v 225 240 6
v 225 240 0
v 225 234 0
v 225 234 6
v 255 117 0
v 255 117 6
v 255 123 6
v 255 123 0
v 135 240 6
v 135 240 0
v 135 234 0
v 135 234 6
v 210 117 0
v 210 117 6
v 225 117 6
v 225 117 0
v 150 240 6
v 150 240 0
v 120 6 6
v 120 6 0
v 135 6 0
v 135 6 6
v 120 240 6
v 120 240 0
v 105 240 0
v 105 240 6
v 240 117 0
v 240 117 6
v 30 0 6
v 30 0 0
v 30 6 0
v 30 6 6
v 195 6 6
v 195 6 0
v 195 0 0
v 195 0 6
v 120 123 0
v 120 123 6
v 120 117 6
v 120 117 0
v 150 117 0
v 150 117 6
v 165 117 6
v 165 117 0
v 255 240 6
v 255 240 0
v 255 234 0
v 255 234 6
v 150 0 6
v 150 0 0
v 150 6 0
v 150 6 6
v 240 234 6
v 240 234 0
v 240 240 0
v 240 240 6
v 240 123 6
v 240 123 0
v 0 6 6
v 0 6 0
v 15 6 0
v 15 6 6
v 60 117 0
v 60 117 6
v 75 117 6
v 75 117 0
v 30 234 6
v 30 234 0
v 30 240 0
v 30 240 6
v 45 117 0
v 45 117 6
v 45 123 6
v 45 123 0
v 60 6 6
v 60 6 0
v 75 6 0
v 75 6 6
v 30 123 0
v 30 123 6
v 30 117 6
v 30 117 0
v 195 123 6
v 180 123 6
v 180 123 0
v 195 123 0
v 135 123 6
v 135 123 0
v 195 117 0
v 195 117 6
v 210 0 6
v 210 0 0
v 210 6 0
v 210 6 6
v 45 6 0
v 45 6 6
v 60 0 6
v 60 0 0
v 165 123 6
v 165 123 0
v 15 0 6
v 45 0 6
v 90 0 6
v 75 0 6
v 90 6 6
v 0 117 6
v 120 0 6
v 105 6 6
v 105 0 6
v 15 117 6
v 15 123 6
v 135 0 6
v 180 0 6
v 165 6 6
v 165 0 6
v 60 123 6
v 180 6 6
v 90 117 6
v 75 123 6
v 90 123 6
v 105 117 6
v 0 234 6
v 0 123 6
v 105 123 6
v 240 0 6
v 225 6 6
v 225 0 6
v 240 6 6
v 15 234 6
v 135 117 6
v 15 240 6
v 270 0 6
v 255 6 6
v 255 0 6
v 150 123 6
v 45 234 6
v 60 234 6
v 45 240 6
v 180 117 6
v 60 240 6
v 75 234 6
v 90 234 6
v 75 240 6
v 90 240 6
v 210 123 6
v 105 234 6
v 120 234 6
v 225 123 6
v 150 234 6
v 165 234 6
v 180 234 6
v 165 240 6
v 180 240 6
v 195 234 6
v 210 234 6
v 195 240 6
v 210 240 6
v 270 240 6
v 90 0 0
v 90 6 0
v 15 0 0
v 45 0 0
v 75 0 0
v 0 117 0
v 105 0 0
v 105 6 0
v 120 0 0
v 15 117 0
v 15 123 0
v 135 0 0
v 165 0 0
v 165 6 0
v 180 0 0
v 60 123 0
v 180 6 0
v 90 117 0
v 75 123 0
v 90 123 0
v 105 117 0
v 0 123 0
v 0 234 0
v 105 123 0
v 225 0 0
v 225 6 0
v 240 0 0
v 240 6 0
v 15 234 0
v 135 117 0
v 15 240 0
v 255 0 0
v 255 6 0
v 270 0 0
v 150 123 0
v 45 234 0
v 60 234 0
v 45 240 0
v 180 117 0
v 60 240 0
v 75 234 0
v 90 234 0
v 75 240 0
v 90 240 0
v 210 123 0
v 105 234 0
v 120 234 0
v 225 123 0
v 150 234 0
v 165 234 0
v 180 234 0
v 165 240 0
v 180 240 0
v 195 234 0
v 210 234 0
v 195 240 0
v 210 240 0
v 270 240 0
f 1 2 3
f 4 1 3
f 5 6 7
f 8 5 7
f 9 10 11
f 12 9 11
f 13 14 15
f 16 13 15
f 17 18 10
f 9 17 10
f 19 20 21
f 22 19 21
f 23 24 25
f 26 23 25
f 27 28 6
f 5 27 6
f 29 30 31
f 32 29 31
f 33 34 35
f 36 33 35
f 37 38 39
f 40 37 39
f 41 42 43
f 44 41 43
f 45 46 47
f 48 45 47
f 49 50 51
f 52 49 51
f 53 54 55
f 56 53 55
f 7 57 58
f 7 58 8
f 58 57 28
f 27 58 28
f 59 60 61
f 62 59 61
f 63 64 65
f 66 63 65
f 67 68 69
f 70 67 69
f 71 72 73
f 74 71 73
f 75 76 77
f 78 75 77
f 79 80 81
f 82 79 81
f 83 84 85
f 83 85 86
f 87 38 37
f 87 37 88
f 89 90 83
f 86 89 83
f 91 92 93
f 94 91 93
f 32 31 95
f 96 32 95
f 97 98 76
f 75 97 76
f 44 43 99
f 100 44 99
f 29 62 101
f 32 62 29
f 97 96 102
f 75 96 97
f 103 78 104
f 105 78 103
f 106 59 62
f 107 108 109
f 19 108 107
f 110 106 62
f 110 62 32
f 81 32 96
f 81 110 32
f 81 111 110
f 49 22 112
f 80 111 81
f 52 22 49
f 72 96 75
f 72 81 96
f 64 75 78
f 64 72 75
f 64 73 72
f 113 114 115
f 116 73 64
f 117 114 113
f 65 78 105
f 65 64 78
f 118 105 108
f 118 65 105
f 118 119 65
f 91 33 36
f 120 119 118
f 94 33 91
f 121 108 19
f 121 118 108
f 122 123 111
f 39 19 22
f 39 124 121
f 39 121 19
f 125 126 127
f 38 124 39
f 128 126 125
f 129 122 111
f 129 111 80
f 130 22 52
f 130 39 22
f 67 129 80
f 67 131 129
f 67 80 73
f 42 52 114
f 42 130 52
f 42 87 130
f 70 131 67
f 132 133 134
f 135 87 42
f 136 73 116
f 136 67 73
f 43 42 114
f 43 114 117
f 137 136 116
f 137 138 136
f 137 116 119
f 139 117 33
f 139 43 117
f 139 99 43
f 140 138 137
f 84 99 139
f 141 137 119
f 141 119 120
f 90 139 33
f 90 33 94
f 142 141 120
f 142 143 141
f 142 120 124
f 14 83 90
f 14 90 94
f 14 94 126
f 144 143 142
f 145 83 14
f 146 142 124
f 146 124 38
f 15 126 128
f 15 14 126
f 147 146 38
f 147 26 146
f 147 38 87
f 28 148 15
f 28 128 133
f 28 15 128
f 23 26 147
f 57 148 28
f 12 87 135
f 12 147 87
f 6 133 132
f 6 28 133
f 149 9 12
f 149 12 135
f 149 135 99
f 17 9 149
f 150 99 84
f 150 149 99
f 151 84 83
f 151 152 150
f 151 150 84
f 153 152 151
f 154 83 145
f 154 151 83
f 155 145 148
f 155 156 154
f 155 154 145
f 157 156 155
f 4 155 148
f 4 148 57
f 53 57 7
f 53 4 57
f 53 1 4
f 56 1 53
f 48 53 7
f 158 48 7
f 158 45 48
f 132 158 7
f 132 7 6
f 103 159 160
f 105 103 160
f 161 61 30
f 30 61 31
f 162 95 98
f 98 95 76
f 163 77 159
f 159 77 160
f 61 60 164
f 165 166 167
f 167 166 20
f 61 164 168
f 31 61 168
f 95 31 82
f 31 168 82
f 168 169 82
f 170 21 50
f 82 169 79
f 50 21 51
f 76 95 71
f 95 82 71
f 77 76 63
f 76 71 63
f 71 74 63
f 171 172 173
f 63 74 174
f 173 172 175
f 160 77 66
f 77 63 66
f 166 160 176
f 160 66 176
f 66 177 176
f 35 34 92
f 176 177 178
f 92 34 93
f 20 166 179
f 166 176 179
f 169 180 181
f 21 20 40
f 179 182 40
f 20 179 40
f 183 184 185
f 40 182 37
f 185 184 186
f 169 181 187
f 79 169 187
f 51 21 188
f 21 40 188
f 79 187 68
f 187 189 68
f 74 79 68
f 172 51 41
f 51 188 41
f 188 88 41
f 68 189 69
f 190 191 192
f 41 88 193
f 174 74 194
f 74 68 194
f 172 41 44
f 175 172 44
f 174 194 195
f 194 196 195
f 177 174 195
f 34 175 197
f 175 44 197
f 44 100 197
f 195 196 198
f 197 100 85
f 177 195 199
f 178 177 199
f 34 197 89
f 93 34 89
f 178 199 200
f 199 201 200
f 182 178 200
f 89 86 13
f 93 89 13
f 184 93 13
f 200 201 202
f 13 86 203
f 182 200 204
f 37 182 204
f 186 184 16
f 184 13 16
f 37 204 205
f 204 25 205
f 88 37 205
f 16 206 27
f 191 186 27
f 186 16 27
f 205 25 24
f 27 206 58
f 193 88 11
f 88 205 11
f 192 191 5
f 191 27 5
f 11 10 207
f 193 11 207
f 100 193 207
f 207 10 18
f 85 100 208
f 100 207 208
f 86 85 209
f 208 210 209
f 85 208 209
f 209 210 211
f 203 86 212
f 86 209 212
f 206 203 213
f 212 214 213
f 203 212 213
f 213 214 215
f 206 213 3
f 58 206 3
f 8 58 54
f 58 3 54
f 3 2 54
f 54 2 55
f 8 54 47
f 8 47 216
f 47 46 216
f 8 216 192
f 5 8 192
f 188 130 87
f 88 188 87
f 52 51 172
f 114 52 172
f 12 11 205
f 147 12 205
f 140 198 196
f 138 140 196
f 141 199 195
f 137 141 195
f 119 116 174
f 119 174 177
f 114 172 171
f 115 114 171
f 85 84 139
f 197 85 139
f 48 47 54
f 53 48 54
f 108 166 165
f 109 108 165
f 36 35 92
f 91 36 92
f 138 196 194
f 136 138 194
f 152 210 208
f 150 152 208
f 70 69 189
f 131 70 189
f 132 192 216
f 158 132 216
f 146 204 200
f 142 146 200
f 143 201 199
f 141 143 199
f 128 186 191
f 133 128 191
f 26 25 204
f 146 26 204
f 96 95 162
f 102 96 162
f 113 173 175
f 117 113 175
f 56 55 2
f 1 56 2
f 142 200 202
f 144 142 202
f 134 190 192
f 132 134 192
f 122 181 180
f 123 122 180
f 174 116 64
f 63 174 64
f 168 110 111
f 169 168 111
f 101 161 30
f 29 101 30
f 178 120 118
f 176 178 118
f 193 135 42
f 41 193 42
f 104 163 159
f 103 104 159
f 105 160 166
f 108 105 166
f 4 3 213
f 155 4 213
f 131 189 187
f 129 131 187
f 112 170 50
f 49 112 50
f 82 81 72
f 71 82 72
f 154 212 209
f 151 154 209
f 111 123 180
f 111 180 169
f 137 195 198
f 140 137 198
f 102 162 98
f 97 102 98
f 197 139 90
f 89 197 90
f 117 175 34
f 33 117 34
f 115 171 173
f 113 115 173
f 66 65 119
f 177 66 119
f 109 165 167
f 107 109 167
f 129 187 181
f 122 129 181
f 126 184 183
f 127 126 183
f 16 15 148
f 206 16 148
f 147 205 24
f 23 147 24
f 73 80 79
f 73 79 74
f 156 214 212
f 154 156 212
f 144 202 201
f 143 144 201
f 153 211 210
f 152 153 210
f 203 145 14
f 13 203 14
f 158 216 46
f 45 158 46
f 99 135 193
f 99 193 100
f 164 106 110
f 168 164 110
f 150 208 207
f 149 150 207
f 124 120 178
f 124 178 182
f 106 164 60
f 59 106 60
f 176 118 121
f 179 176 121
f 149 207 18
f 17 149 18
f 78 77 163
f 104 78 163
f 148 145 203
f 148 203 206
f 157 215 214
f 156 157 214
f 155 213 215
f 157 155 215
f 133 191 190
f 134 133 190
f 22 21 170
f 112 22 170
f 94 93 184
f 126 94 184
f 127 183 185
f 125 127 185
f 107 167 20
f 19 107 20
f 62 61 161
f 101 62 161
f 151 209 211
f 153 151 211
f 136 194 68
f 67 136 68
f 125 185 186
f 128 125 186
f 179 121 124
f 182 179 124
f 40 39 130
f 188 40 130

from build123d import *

# Parameters (mm, degrees)
F1_DEPTH = 6
F2_W     = 15
F2_H     = 3
F3_DEPTH = 6.001


with BuildPart() as f1:
    # F0 (on Top) → F1 (new body)
    with BuildSketch(Plane.XY):
        Polygon((15, 6), (15, 0), (30, 0), (30, 6), (45, 6), (45, 0), (60, 0), (60, 6), (75, 6), (75, 0), (90, 0), (90, 6), (105, 6), (105, 0), (120, 0), (120, 6), (135, 6), (135, 0), (150, 0), (150, 6), (165, 6), (165, 0), (180, 0), (180, 6), (195, 6), (195, 0), (210, 0), (210, 6), (225, 6), (225, 0), (240, 0), (240, 6), (255, 6), (255, 0), (270, 0), (270, 240), (255, 240), (255, 234), (240, 234), (240, 240), (225, 240), (225, 234), (210, 234), (210, 240), (195, 240), (195, 234), (180, 234), (180, 240), (165, 240), (165, 234), (150, 234), (150, 240), (135, 240), (135, 234), (120, 234), (120, 240), (105, 240), (105, 234), (90, 234), (90, 240), (75, 240), (75, 234), (60, 234), (60, 240), (45, 240), (45, 234), (30, 234), (30, 240), (15, 240), (15, 234), (0, 234), (0, 6), align=None)
    extrude(amount=F1_DEPTH)

    # F2 (on face) → F3 (cut, through all)
    with BuildSketch(Plane.XY.offset(6)):
        with Locations((7.5, 121.5)):
            Rectangle(F2_W, F2_H)
        with Locations((7.5, 118.5)):
            Rectangle(F2_W, F2_H)
        with Locations((37.5, 121.5)):
            Rectangle(F2_W, F2_H)
        with Locations((37.5, 118.5)):
            Rectangle(F2_W, F2_H)
        with Locations((67.5, 121.5)):
            Rectangle(F2_W, F2_H)
        with Locations((67.5, 118.5)):
            Rectangle(F2_W, F2_H)
        with Locations((97.5, 121.5)):
            Rectangle(F2_W, F2_H)
        with Locations((97.5, 118.5)):
            Rectangle(F2_W, F2_H)
        with Locations((127.5, 121.5)):
            Rectangle(F2_W, F2_H)
        with Locations((127.5, 118.5)):
            Rectangle(F2_W, F2_H)
        with Locations((157.5, 121.5)):
            Rectangle(F2_W, F2_H)
        with Locations((157.5, 118.5)):
            Rectangle(F2_W, F2_H)
        with Locations((187.5, 121.5)):
            Rectangle(F2_W, F2_H)
        with Locations((187.5, 118.5)):
            Rectangle(F2_W, F2_H)
        with Locations((247.5, 121.5)):
            Rectangle(F2_W, F2_H)
        with Locations((247.5, 118.5)):
            Rectangle(F2_W, F2_H)
        with Locations((217.5, 118.5)):
            Rectangle(F2_W, F2_H)
        with Locations((217.5, 121.5)):
            Rectangle(F2_W, F2_H)
    extrude(amount=-F3_DEPTH, mode=Mode.SUBTRACT)


solid = f1.part
